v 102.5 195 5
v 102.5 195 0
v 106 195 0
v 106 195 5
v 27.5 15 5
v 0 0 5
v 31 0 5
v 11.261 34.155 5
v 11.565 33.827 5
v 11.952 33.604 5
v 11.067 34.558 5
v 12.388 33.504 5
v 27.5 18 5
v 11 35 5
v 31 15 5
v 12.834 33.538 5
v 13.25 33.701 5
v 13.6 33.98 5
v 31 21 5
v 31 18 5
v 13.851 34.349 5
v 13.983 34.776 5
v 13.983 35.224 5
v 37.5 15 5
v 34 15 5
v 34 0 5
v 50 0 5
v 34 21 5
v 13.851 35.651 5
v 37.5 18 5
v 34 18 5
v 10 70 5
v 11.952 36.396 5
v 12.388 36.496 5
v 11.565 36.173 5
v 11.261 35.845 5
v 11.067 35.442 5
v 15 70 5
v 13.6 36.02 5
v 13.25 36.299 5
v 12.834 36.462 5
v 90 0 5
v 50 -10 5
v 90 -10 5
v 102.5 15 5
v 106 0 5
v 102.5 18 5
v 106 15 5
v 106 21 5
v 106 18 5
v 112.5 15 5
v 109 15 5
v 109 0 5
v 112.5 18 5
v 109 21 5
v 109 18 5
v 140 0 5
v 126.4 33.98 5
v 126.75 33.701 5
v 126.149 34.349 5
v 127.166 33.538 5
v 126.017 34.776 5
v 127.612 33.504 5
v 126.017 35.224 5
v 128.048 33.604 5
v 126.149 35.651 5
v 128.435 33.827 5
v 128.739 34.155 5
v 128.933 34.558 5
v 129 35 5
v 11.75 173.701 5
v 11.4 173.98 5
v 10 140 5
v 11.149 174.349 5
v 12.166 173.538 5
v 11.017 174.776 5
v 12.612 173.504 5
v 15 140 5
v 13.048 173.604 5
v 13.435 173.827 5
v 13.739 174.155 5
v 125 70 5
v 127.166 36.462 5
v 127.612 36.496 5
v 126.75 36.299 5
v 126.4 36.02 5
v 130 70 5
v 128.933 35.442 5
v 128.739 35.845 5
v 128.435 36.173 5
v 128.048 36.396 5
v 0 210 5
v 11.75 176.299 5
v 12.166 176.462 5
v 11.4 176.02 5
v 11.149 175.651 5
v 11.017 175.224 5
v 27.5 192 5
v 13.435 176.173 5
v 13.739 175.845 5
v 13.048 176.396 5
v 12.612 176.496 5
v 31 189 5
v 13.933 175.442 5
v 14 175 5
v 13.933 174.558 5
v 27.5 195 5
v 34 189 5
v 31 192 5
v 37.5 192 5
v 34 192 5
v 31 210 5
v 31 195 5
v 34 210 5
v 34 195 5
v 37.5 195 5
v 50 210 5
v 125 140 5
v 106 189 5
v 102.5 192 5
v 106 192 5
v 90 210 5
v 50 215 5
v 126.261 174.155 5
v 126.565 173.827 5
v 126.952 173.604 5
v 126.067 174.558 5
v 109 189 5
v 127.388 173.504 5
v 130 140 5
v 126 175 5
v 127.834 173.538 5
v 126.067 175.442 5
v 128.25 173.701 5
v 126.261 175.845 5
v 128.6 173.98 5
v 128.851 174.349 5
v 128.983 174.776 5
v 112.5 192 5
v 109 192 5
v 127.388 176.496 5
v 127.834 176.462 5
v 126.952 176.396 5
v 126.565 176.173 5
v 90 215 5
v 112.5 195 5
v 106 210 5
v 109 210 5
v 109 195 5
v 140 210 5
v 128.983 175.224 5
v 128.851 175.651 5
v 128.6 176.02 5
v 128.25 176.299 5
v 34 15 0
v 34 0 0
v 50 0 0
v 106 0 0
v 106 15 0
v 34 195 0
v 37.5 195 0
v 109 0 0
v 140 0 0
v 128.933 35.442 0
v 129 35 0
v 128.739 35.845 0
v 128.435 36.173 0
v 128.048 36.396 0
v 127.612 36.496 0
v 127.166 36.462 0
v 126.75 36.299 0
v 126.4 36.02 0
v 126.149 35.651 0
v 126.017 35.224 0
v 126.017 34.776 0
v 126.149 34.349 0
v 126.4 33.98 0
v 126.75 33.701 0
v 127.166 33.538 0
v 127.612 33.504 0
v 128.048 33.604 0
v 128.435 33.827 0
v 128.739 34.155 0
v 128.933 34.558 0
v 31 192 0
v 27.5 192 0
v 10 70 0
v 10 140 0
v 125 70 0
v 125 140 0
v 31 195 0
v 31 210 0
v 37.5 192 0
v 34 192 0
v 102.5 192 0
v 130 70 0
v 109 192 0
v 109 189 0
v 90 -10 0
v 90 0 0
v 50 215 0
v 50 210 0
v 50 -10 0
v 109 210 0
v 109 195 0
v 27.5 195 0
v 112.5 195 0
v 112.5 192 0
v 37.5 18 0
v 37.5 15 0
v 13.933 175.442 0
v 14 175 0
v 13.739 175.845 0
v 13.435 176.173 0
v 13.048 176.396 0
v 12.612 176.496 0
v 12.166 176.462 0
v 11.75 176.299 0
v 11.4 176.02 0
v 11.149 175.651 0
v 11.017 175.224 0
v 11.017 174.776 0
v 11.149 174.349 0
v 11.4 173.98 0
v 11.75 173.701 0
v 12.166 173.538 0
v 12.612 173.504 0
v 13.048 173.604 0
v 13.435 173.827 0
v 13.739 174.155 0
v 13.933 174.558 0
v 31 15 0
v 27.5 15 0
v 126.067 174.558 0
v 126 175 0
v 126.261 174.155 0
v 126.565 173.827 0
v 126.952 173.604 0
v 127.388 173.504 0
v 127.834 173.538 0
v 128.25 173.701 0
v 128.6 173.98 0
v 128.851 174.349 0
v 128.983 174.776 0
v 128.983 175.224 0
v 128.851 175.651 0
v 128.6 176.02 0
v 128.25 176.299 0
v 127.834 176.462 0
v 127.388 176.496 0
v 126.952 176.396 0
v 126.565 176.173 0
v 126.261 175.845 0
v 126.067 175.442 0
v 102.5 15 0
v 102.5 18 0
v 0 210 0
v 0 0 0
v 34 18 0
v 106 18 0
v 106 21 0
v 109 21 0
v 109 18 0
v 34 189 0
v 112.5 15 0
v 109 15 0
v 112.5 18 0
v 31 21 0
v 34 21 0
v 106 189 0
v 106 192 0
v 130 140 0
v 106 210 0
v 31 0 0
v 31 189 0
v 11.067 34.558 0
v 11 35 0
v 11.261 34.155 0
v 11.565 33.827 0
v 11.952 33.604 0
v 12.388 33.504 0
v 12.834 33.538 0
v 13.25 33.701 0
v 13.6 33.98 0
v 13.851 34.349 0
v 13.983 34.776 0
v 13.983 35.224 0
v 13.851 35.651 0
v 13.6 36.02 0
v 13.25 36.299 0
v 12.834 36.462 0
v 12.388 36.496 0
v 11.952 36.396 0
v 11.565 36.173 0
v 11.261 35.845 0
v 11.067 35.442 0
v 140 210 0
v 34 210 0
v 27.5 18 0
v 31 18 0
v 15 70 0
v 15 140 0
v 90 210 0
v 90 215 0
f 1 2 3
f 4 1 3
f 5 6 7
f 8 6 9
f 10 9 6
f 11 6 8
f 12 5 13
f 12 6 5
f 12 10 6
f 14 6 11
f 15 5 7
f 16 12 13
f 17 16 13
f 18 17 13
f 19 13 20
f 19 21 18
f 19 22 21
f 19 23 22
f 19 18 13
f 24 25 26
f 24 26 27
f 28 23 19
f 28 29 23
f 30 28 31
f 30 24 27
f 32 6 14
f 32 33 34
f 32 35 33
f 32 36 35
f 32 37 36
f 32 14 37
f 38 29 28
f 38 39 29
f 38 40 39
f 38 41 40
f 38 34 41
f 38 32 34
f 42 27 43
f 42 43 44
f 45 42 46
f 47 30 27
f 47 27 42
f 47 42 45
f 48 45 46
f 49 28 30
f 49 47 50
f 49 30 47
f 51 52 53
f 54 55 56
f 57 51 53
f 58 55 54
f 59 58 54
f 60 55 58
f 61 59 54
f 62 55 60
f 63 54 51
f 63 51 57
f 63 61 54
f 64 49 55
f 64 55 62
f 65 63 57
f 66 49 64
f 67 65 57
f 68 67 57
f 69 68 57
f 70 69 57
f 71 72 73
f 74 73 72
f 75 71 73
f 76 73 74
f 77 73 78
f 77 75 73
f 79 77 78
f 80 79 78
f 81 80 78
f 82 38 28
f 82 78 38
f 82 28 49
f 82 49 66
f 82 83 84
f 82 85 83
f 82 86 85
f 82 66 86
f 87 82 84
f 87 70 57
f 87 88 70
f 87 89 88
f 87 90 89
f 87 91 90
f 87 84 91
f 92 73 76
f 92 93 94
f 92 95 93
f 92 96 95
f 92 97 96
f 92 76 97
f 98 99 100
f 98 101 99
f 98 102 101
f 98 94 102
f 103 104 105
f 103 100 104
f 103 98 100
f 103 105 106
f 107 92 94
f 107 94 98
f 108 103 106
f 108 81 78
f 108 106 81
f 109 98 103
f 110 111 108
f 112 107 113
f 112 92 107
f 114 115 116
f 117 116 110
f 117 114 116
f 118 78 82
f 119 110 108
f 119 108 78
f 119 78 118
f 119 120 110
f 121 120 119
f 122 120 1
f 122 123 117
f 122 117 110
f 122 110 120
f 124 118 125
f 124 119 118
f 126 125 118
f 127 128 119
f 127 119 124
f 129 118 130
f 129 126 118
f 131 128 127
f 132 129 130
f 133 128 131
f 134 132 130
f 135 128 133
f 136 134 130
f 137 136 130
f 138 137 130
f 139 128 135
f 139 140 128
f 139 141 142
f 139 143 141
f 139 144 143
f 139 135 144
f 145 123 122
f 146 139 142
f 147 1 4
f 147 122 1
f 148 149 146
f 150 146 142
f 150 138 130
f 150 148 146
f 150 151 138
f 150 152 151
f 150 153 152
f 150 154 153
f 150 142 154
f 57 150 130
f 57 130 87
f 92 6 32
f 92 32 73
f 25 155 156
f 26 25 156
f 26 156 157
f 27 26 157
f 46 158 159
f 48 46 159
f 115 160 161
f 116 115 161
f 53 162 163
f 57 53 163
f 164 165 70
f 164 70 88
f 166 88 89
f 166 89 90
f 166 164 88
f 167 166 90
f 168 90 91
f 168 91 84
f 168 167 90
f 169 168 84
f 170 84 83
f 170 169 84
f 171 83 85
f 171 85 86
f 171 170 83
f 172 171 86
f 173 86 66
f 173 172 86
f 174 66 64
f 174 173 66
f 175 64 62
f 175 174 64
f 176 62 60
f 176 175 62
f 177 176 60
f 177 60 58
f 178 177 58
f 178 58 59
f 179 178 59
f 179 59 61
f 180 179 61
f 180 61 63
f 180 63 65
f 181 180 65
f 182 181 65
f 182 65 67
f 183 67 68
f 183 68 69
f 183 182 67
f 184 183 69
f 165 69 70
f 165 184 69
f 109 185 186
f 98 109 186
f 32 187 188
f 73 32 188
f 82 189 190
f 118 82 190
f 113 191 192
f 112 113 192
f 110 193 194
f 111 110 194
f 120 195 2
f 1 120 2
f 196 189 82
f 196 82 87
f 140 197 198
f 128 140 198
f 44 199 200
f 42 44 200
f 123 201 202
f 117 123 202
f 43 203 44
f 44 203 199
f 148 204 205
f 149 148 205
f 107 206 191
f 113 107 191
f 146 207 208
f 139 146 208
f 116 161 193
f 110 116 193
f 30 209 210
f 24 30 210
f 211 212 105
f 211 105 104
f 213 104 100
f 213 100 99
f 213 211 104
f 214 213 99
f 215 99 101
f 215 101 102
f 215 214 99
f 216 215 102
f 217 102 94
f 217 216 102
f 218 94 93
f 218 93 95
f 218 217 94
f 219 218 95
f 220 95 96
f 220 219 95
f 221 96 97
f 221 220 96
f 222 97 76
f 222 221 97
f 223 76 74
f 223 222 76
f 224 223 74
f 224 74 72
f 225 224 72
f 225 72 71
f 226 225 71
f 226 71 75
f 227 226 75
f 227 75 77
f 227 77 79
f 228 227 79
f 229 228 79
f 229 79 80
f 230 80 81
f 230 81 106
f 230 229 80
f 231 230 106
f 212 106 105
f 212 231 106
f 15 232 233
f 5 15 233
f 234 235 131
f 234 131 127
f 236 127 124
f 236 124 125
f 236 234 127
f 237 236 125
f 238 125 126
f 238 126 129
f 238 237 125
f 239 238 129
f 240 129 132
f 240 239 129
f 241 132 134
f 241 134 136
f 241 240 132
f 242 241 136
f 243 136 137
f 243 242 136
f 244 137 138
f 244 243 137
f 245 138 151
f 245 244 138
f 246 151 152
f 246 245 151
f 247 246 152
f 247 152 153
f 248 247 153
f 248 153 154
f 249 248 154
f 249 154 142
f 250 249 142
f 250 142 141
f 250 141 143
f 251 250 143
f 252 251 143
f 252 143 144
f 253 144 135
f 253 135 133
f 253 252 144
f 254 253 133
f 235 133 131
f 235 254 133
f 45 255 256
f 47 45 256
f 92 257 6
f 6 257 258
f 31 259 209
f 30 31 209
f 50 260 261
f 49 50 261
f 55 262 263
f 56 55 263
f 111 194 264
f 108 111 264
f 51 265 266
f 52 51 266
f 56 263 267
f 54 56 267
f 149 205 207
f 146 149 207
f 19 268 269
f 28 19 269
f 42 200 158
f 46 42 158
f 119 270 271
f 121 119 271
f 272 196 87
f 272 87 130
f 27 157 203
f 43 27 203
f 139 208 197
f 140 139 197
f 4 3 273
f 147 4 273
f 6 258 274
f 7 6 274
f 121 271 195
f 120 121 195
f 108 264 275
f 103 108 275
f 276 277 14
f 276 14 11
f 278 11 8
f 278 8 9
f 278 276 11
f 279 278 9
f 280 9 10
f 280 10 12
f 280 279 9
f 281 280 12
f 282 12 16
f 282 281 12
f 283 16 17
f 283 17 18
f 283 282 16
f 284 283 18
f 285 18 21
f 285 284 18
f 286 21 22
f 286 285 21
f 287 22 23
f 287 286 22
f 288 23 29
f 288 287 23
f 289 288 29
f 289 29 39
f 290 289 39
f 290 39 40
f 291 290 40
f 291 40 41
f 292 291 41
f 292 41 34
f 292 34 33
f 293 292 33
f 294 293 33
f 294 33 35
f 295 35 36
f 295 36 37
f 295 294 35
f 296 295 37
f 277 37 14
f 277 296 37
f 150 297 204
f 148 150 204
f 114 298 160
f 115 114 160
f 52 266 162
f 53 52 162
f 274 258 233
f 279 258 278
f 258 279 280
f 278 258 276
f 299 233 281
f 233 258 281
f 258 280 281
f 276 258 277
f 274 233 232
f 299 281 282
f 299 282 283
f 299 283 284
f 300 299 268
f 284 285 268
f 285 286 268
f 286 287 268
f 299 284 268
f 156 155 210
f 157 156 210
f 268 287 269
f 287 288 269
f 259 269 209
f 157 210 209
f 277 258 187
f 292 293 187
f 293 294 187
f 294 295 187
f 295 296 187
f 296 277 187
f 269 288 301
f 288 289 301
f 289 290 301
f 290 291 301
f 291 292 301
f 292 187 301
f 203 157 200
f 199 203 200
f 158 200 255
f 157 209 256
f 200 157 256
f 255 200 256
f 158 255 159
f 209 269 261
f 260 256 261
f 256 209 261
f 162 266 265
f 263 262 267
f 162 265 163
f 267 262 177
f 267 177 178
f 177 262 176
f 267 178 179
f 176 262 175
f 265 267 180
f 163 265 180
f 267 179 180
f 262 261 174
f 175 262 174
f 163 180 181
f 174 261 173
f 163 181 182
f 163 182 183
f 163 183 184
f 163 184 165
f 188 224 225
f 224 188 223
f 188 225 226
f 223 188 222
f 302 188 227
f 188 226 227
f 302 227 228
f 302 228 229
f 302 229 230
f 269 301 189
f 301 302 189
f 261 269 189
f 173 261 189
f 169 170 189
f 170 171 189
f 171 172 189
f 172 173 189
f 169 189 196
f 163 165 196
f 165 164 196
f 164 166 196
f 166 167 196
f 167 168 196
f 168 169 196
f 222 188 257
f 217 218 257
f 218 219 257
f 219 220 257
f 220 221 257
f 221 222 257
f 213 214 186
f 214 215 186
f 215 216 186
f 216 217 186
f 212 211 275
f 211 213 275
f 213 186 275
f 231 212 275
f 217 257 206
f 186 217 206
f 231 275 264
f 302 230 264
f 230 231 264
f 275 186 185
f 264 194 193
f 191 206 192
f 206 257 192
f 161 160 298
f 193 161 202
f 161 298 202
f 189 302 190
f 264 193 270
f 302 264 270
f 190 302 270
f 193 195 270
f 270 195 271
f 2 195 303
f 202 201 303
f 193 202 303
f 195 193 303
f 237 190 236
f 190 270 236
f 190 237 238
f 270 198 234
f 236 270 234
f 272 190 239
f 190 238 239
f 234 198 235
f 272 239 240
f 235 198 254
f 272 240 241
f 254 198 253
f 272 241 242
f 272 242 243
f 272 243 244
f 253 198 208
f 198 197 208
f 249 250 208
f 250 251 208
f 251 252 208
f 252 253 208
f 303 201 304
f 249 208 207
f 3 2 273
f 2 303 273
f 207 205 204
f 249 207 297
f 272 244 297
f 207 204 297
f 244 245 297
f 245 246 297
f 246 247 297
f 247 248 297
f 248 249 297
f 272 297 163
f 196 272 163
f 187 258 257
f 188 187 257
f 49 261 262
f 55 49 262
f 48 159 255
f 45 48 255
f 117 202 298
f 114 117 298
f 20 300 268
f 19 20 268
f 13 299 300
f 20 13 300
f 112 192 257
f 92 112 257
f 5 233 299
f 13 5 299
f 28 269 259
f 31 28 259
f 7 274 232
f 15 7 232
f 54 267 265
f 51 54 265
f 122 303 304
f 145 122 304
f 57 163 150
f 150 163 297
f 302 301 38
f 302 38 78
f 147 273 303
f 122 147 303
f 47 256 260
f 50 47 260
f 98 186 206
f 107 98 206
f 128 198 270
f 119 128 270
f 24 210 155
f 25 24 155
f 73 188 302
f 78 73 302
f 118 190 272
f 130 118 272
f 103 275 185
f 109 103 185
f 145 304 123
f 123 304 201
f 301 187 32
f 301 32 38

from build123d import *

# Parameters (mm, degrees)
CROQUIS1_R              = 1.5
CROQUIS1_W              = 5
CROQUIS1_H              = 70
SALIENTE_EXTRUIR1_DEPTH = 5


with BuildPart() as part:
    # Croquis1 → Saliente-Extruir1 (new body)
    with BuildSketch(Plane.XY):
        Polygon((0, 0), (31, 0), (31, 15), (27.5, 15), (27.5, 18), (31, 18), (31, 21), (34, 21), (34, 18), (37.5, 18), (37.5, 15), (34, 15), (34, 0), (50, 0), (50, -10), (90, -10), (90, 0), (106, 0), (106, 15), (102.5, 15), (102.5, 18), (106, 18), (106, 21), (109, 21), (109, 18), (112.5, 18), (112.5, 15), (109, 15), (109, 0), (140, 0), (140, 210), (109, 210), (109, 195), (112.5, 195), (112.5, 192), (109, 192), (109, 189), (106, 189), (106, 192), (102.5, 192), (102.5, 195), (106, 195), (106, 210), (90, 210), (90, 215), (50, 215), (50, 210), (34, 210), (34, 195), (37.5, 195), (37.5, 192), (34, 192), (34, 189), (31, 189), (31, 192), (27.5, 192), (27.5, 195), (31, 195), (31, 210), (0, 210), align=None)
        with Locations((12.5, 175)):
            Circle(CROQUIS1_R, mode=Mode.SUBTRACT)
        with Locations(Location((12.5, 35, 0), (0, 0, 180))):
            Circle(CROQUIS1_R, mode=Mode.SUBTRACT)
        with Locations(Location((127.5, 175, 0), (0, 0, 180))):
            Circle(CROQUIS1_R, mode=Mode.SUBTRACT)
        with Locations((127.5, 35)):
            Circle(CROQUIS1_R, mode=Mode.SUBTRACT)
        with Locations((127.5, 105)):
            Rectangle(CROQUIS1_W, CROQUIS1_H, mode=Mode.SUBTRACT)
        with Locations((12.5, 105)):
            Rectangle(CROQUIS1_W, CROQUIS1_H, mode=Mode.SUBTRACT)
    extrude(amount=SALIENTE_EXTRUIR1_DEPTH)


solid = part.part
